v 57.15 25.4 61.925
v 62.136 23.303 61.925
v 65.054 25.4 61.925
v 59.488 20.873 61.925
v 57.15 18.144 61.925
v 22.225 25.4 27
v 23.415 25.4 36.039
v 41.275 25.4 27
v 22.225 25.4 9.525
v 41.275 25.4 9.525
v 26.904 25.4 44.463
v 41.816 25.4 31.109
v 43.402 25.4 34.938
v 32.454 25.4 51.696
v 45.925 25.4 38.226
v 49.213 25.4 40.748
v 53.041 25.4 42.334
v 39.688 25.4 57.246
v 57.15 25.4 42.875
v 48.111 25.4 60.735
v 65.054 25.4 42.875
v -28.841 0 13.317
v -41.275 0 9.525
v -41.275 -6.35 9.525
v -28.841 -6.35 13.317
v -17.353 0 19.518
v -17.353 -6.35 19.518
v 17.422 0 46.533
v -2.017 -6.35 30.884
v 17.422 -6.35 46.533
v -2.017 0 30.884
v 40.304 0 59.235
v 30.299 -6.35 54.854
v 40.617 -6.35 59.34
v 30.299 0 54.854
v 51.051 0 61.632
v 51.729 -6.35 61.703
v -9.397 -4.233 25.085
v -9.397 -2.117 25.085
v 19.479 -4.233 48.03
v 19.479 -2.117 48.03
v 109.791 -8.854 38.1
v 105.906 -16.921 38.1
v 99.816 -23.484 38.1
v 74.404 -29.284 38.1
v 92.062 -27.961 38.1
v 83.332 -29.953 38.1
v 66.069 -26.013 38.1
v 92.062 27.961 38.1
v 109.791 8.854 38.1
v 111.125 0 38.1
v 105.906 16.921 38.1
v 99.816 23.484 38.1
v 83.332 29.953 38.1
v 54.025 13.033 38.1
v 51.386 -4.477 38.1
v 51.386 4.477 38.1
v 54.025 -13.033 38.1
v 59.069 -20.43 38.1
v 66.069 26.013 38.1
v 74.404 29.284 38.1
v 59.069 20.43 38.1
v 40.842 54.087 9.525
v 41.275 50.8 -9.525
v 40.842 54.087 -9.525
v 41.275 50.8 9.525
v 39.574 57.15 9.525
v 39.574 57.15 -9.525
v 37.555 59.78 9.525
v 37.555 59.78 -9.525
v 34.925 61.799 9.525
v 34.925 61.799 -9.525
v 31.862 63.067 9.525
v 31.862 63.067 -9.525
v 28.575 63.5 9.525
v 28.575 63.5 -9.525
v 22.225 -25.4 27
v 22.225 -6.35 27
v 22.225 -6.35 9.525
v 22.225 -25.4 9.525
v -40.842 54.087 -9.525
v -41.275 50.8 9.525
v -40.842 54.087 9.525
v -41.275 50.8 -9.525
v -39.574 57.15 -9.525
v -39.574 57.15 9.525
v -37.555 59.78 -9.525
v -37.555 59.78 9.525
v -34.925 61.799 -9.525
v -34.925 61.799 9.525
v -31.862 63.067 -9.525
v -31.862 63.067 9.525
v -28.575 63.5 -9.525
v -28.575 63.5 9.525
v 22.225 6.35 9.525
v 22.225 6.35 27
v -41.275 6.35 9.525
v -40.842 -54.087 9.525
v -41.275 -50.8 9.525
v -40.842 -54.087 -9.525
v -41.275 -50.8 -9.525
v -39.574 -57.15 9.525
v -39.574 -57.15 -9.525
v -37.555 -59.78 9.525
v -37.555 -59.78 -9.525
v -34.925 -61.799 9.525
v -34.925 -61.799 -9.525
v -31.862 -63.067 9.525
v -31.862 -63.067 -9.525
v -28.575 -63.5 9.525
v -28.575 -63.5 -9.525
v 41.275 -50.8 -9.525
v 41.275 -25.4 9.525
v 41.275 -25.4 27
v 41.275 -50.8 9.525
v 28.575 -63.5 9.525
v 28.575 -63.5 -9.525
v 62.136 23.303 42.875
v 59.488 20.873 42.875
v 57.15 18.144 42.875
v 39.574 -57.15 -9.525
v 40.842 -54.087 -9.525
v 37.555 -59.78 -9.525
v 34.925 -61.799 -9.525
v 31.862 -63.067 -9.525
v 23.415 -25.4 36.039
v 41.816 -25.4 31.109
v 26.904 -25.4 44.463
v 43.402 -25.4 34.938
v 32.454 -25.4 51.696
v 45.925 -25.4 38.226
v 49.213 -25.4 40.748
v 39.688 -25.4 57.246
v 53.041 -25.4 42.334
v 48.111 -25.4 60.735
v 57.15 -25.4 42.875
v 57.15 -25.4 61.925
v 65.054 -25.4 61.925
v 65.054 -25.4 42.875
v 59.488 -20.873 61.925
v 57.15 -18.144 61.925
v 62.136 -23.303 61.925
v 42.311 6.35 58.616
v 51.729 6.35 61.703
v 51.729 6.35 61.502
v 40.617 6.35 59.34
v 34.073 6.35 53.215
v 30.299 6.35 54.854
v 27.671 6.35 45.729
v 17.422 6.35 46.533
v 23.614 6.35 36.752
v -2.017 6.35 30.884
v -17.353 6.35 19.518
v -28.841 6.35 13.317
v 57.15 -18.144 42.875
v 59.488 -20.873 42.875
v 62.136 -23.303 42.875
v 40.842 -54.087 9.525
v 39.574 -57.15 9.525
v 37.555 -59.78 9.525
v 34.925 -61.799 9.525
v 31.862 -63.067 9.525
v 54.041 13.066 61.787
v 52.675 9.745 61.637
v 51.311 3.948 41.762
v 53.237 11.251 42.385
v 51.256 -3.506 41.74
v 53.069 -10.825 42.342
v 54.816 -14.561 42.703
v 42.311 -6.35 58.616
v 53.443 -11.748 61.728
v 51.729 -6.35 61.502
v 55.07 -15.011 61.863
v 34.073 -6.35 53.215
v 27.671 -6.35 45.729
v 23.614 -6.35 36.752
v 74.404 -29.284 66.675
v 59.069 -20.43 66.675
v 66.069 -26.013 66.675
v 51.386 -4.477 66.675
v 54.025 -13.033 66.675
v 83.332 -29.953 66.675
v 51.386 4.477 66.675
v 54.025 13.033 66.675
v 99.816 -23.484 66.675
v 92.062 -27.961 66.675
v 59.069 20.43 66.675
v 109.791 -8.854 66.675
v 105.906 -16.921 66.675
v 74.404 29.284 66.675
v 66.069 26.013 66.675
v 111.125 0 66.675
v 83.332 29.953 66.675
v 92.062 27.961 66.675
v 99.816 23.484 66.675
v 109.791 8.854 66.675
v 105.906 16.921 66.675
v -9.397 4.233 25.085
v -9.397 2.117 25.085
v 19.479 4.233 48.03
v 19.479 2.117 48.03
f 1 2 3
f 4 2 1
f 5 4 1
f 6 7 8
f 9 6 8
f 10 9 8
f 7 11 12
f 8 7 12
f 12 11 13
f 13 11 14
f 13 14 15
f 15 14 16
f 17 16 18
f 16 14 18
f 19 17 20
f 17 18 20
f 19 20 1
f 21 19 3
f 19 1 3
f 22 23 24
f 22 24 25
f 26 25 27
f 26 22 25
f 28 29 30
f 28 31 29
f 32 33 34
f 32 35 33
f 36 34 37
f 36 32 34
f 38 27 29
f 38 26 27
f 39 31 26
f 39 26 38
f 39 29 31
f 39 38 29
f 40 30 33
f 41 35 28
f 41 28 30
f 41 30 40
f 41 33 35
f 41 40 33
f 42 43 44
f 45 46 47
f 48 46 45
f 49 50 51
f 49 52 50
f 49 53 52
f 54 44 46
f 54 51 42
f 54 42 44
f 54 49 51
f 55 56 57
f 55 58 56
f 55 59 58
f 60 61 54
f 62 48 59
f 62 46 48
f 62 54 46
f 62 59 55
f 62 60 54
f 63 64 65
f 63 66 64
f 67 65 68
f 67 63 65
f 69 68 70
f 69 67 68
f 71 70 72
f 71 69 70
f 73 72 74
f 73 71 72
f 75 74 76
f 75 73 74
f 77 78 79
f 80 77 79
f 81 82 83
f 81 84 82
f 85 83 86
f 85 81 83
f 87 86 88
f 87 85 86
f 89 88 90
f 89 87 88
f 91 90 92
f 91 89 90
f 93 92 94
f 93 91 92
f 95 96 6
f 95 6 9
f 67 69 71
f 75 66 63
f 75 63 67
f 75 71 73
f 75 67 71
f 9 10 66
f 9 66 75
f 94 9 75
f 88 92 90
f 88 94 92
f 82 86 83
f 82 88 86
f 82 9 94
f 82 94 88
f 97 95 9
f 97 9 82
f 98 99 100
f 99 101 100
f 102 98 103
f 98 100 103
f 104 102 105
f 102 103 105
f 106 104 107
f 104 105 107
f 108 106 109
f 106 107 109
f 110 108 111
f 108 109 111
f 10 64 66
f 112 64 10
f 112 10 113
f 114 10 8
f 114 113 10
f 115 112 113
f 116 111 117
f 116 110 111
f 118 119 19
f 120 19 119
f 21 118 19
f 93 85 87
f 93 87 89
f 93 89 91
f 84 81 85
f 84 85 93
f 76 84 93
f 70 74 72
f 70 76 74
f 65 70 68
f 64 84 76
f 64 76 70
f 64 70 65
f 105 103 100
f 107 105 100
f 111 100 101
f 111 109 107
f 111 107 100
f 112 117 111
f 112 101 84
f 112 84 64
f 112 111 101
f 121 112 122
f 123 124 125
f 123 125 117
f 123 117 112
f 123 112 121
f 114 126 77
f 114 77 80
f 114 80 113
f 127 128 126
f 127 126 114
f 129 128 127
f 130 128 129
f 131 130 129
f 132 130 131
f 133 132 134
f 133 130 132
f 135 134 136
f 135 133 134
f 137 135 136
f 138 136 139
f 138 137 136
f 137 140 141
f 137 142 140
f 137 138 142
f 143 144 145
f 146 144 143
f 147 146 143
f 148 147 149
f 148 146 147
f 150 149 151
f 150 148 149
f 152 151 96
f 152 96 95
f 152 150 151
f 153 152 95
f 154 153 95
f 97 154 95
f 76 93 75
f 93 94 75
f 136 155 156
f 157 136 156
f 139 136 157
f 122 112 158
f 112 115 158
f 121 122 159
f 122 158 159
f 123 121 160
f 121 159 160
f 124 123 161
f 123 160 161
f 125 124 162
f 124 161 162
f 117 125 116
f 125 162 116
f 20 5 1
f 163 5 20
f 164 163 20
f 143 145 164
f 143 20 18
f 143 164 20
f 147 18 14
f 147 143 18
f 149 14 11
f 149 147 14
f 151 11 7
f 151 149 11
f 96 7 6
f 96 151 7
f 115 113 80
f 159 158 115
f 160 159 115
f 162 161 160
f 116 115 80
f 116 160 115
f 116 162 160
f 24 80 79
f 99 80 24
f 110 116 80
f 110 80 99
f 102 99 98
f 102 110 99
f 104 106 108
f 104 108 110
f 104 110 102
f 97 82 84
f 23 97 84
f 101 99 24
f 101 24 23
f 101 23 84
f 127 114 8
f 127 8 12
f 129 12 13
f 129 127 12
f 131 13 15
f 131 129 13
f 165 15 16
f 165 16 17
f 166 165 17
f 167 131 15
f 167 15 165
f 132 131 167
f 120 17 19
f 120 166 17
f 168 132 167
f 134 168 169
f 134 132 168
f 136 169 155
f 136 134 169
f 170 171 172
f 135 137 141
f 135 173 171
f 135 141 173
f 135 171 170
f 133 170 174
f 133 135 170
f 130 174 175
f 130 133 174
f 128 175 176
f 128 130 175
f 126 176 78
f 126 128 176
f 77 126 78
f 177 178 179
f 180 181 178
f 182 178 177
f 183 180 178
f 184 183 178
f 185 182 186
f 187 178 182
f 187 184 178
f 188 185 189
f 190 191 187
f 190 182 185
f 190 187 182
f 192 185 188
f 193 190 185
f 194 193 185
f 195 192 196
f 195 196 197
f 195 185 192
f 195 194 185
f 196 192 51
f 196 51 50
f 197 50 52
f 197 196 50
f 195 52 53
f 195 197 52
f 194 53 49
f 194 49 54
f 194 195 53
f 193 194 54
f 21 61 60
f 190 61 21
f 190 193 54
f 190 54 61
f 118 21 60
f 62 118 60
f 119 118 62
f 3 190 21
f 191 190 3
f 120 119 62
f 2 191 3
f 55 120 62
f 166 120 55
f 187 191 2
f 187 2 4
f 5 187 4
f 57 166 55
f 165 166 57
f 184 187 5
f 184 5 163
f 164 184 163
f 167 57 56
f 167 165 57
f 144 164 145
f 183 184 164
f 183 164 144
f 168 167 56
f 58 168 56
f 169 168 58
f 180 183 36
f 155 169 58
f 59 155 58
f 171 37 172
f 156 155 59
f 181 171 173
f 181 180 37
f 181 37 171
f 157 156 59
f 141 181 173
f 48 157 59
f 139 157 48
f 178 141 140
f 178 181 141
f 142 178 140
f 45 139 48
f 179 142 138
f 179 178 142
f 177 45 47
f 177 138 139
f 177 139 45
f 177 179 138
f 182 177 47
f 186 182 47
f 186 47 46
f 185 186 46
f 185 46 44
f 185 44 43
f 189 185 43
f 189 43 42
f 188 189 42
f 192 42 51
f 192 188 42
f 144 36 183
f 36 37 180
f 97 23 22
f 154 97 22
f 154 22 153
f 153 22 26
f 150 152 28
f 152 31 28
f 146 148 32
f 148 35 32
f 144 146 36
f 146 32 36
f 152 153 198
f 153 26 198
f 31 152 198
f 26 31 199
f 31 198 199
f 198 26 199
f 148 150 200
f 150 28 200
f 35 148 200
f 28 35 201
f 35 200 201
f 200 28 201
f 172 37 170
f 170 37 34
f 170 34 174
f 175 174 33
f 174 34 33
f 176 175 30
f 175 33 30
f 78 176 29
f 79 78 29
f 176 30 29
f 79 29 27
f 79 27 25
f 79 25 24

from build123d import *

# Parameters (mm, degrees)
F1_DEPTH = 63.5
F0_W     = 20.7627861344
F0_H     = 19.05
F2_DEPTH = 25.4
F3_DEPTH = 6.35
F5_R     = 12.7


with BuildPart() as f1:
    # F0 (on Front) → F1 (new body, symmetric)
    with BuildSketch(Plane.XZ):
        Polygon((-41.275, -9.525), (41.275, -9.525), (41.275, 9.525), (22.225, 9.525), (-41.275, 9.525), align=None)
    extrude(amount=F1_DEPTH, both=True)

    # F0 (on Front) → F2 (join, symmetric)
    with BuildSketch(Plane.XZ):
        with BuildLine():
            Line((22.225, 9.525), (41.275, 9.525))
            Line((41.275, 9.525), (41.275, 27.0002))
            ThreePointArc((41.275, 27.0002), (45.9246798487, 38.2255201513), (57.15, 42.8752))
            Line((57.15, 42.8752), (60.325, 42.8752))
            Line((60.325, 42.8752), (60.325, 61.9252))
            Line((60.325, 61.9252), (57.15, 61.9252))
            ThreePointArc((57.15, 61.9252), (32.4542956671, 51.6959043329), (22.225, 27.0002))
            Line((22.225, 27.0002), (22.225, 9.525))
        make_face()
        with Locations((70.7063930672, 52.4002)):
            Rectangle(F0_W, F0_H)
    extrude(amount=F2_DEPTH, both=True)

    # F0 (on Front) → F3 (join, symmetric)
    with BuildSketch(Plane.XZ):
        with BuildLine():
            add(Edge.make_bspline(
                [(-41.275, 9.525), (-4.0282602422, 16.1482468247), (17.7380666137, 62.469098717), (57.15, 61.9252)],
                knots=[0, 0, 0, 0, 111.5045361635, 111.5045361635, 111.5045361635, 111.5045361635], degree=3))
            Line((-41.275, 9.525), (22.225, 9.525))
            Line((22.225, 9.525), (22.225, 27.0002))
            ThreePointArc((22.225, 27.0002), (32.4542956671, 51.6959043329), (57.15, 61.9252))
        make_face()
    extrude(amount=F3_DEPTH, both=True)

    # F0 (on Front) → F4 (revolve)
    with BuildSketch(Plane.XZ):
        Polygon((81.0877861344, 66.675), (81.0877861344, 61.9252), (81.0877861344, 42.8752), (81.0877861344, 38.1), (111.125, 38.1), (111.125, 66.675), align=None)
    revolve(axis=Axis((81.0877861344, 0, 52.4002), (0, 0, 1)))

    # F5
    f5_edges = [f1.edges().sort_by_distance(p)[0] for p in [
        (-41.275, 63.5, 0),
        (-41.275, -63.5, 0),
        (41.275, -63.5, 0),
        (41.275, 63.5, 0),
    ]]
    fillet(f5_edges, radius=F5_R)


solid = f1.part
